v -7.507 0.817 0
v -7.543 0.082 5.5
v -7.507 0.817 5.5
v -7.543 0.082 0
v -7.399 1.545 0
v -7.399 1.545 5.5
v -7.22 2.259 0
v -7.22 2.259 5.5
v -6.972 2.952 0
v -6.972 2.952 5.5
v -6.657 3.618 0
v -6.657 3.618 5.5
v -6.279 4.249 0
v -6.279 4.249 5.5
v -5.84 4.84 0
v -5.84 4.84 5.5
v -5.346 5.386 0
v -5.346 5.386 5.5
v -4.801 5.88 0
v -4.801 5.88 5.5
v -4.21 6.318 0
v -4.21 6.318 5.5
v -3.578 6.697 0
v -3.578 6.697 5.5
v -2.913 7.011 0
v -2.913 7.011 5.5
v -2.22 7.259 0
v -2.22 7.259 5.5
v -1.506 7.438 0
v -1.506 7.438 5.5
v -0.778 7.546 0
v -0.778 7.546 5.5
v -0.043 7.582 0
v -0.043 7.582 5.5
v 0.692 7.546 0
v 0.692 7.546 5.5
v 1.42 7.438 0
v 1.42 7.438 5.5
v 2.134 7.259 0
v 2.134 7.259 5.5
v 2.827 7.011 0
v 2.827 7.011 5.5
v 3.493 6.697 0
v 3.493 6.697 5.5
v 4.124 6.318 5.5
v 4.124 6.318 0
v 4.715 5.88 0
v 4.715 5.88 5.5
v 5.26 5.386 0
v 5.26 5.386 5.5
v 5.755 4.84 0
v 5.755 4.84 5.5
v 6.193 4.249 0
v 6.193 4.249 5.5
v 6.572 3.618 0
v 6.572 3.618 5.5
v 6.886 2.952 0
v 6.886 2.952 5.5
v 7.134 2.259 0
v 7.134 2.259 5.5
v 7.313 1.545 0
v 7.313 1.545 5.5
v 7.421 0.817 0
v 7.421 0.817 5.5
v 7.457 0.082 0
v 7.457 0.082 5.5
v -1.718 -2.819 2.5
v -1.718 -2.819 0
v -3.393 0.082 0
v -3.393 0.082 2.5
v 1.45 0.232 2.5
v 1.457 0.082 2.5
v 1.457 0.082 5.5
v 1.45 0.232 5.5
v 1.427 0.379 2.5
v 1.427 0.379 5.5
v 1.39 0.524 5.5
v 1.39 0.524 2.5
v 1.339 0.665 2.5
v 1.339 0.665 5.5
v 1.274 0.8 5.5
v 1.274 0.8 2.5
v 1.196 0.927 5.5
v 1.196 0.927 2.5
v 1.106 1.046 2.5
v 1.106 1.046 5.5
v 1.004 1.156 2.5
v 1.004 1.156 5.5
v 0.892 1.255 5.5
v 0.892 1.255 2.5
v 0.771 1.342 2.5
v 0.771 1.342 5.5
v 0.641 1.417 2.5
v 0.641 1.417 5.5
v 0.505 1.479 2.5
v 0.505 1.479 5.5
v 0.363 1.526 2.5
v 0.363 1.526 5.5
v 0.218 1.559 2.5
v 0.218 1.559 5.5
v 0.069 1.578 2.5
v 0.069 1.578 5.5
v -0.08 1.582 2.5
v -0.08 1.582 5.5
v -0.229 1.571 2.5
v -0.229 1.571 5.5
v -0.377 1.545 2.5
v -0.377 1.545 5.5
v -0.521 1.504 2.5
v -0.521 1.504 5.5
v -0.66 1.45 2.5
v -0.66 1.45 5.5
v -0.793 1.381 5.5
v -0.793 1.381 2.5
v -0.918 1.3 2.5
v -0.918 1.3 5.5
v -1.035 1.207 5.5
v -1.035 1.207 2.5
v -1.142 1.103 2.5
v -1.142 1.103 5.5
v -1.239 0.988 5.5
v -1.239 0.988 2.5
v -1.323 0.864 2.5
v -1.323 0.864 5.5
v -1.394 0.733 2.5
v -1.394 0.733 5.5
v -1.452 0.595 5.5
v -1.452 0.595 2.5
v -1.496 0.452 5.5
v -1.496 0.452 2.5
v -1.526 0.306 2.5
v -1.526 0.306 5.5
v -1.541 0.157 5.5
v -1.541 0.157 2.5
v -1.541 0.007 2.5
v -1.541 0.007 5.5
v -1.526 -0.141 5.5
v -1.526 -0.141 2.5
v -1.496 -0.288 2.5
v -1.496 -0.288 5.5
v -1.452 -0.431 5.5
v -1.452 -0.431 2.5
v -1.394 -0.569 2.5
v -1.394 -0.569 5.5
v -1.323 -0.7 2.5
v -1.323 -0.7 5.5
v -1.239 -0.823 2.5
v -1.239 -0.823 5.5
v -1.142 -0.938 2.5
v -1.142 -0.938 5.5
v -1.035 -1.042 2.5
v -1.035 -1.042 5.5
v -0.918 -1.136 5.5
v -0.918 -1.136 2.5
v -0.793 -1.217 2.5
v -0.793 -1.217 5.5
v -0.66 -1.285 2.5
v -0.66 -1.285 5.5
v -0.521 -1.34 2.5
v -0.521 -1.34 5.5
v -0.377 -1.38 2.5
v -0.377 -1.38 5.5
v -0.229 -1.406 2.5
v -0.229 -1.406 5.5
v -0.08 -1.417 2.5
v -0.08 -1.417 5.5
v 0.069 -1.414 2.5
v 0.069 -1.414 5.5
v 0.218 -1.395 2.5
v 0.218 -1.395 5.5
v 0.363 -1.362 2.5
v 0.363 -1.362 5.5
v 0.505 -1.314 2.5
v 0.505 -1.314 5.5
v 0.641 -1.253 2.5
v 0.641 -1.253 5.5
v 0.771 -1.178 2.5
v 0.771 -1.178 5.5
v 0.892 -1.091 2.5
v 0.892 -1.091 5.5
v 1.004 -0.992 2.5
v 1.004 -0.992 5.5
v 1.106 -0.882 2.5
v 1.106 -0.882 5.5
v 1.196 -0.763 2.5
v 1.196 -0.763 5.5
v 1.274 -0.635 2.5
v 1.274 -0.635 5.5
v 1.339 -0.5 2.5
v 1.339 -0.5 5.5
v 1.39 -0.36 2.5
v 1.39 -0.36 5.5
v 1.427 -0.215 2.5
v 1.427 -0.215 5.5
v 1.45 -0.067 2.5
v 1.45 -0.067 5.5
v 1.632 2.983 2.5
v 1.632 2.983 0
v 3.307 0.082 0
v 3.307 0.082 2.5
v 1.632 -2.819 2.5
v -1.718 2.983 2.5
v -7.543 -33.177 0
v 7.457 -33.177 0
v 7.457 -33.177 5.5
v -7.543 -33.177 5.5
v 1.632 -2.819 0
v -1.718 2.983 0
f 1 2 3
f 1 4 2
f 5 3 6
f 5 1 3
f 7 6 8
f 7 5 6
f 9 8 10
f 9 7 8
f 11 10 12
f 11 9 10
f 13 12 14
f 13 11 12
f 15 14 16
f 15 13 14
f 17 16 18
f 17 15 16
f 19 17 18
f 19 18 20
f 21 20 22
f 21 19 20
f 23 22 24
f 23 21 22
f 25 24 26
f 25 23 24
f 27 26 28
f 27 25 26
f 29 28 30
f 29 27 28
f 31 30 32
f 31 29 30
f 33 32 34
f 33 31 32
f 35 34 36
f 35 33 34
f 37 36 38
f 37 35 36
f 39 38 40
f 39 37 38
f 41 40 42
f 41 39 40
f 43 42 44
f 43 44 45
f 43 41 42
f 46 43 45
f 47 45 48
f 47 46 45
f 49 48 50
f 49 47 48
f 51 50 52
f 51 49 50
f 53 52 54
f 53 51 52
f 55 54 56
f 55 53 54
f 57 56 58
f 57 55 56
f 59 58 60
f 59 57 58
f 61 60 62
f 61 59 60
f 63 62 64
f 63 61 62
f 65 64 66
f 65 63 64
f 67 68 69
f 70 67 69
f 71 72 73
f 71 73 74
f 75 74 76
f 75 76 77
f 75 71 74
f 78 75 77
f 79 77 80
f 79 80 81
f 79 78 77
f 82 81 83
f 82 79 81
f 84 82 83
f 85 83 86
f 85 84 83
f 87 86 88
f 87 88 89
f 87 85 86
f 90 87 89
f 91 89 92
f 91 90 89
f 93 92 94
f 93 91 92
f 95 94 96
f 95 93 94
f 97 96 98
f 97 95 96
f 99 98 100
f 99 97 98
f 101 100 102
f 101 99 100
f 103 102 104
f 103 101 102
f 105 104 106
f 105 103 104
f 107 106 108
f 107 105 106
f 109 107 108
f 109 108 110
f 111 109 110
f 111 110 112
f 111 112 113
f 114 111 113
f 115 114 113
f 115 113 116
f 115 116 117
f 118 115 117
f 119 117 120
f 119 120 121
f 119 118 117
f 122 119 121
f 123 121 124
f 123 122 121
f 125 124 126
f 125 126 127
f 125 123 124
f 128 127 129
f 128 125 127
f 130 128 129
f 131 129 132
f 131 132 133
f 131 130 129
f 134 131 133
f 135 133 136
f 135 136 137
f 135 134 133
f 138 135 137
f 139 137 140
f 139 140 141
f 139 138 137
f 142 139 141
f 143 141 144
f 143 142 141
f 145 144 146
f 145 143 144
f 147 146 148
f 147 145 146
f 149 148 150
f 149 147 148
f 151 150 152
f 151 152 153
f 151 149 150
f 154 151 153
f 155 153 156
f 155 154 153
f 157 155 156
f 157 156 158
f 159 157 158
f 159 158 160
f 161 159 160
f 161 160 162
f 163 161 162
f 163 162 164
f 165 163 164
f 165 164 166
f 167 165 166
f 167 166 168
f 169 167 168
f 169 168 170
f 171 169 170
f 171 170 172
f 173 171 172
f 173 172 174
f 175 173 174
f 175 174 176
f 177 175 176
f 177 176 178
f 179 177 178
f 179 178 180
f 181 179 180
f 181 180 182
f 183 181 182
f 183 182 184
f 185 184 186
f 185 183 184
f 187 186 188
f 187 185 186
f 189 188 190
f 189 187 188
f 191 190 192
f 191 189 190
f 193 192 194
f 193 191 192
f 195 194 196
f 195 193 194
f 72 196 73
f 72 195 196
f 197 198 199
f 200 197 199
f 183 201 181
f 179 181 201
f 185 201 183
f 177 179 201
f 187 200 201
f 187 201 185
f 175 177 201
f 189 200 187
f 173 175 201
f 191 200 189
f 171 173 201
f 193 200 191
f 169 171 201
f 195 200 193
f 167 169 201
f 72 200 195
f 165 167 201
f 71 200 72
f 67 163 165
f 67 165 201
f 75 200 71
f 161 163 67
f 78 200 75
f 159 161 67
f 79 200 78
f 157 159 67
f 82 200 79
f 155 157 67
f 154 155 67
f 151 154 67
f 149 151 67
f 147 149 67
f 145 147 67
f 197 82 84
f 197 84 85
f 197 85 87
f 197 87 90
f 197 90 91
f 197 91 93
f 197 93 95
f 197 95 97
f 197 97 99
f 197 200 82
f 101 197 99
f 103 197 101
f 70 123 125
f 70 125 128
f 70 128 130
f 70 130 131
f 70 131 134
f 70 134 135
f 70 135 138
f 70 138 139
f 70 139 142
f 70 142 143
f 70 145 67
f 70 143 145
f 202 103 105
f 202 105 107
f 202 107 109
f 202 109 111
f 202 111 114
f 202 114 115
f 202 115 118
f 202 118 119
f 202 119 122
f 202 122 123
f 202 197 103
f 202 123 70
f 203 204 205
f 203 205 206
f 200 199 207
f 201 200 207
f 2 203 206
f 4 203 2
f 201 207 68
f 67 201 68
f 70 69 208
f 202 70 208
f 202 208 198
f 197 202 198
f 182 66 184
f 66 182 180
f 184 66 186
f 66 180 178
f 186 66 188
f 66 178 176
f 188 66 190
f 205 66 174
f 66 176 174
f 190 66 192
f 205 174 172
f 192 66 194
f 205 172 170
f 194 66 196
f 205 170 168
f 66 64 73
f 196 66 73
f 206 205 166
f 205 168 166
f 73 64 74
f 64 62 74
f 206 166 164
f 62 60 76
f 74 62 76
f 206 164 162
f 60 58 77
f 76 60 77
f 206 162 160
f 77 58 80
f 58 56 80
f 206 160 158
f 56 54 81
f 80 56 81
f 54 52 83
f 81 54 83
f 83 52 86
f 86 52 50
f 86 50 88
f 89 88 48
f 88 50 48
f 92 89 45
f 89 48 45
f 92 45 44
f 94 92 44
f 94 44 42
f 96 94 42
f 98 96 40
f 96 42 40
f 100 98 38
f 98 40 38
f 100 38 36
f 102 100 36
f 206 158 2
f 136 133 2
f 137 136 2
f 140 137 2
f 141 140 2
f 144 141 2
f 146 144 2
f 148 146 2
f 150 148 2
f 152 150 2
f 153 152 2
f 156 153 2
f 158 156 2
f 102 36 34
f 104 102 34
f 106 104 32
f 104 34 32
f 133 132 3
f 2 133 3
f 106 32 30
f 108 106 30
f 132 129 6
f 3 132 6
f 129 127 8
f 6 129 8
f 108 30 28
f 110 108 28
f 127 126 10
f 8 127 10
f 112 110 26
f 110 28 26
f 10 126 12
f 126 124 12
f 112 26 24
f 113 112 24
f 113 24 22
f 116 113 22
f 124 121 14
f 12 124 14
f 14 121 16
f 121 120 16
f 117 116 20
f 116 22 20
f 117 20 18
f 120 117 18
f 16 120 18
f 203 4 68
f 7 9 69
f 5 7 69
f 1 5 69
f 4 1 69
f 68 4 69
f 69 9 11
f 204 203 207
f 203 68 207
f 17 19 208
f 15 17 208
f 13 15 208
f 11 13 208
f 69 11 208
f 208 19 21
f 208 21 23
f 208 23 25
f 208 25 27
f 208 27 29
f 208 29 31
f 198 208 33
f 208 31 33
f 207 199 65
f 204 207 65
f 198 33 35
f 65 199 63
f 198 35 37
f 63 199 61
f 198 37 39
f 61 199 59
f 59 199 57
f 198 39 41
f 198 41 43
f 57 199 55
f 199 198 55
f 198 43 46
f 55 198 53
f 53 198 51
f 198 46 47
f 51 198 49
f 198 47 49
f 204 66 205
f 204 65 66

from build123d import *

# Parameters (mm, degrees)
BOSS_EXTRUDE1_DEPTH = 2.5
SKETCH3_R           = 1.5
BOSS_EXTRUDE2_DEPTH = 3


with BuildPart() as part:
    # Sketch1 → Boss-Extrude1 (new body)
    with BuildSketch(Plane.XY):
        with BuildLine():
            ThreePointArc((7.457118183, 0.082245335), (-0.042881817, 7.582245335), (-7.542881817, 0.082245335))
            Line((-7.542881817, 0.082245335), (-7.542881817, -33.176547175))
            Line((-7.542881817, -33.176547175), (7.457118183, -33.176547175))
            Line((7.457118183, -33.176547175), (7.457118183, 0.082245335))
        make_face()
        Polygon((1.632118183, 2.983430437), (3.307118183, 0.082245335), (1.632118183, -2.818939768), (-0.042881817, -2.818939768), (-1.717881817, -2.818939768), (-3.392881817, 0.082245335), (-1.717881817, 2.983430437), (-0.042881817, 2.983430437), align=None, mode=Mode.SUBTRACT)
    extrude(amount=BOSS_EXTRUDE1_DEPTH)

    # Sketch3 → Boss-Extrude2 (add)
    with BuildSketch(Plane.XY.offset(2.5)):
        with BuildLine():
            Line((7.457118183, 0.082245335), (7.457118183, -33.176547175))
            Line((7.457118183, -33.176547175), (-7.542881817, -33.176547175))
            Line((-7.542881817, -33.176547175), (-7.542881817, 0.082245335))
            ThreePointArc((-7.542881817, 0.082245335), (-0.042881817, 7.582245335), (7.457118183, 0.082245335))
        make_face()
        with Locations((-0.042881817, 0.082245335)):
            Circle(SKETCH3_R, mode=Mode.SUBTRACT)
    extrude(amount=BOSS_EXTRUDE2_DEPTH)


solid = part.part
